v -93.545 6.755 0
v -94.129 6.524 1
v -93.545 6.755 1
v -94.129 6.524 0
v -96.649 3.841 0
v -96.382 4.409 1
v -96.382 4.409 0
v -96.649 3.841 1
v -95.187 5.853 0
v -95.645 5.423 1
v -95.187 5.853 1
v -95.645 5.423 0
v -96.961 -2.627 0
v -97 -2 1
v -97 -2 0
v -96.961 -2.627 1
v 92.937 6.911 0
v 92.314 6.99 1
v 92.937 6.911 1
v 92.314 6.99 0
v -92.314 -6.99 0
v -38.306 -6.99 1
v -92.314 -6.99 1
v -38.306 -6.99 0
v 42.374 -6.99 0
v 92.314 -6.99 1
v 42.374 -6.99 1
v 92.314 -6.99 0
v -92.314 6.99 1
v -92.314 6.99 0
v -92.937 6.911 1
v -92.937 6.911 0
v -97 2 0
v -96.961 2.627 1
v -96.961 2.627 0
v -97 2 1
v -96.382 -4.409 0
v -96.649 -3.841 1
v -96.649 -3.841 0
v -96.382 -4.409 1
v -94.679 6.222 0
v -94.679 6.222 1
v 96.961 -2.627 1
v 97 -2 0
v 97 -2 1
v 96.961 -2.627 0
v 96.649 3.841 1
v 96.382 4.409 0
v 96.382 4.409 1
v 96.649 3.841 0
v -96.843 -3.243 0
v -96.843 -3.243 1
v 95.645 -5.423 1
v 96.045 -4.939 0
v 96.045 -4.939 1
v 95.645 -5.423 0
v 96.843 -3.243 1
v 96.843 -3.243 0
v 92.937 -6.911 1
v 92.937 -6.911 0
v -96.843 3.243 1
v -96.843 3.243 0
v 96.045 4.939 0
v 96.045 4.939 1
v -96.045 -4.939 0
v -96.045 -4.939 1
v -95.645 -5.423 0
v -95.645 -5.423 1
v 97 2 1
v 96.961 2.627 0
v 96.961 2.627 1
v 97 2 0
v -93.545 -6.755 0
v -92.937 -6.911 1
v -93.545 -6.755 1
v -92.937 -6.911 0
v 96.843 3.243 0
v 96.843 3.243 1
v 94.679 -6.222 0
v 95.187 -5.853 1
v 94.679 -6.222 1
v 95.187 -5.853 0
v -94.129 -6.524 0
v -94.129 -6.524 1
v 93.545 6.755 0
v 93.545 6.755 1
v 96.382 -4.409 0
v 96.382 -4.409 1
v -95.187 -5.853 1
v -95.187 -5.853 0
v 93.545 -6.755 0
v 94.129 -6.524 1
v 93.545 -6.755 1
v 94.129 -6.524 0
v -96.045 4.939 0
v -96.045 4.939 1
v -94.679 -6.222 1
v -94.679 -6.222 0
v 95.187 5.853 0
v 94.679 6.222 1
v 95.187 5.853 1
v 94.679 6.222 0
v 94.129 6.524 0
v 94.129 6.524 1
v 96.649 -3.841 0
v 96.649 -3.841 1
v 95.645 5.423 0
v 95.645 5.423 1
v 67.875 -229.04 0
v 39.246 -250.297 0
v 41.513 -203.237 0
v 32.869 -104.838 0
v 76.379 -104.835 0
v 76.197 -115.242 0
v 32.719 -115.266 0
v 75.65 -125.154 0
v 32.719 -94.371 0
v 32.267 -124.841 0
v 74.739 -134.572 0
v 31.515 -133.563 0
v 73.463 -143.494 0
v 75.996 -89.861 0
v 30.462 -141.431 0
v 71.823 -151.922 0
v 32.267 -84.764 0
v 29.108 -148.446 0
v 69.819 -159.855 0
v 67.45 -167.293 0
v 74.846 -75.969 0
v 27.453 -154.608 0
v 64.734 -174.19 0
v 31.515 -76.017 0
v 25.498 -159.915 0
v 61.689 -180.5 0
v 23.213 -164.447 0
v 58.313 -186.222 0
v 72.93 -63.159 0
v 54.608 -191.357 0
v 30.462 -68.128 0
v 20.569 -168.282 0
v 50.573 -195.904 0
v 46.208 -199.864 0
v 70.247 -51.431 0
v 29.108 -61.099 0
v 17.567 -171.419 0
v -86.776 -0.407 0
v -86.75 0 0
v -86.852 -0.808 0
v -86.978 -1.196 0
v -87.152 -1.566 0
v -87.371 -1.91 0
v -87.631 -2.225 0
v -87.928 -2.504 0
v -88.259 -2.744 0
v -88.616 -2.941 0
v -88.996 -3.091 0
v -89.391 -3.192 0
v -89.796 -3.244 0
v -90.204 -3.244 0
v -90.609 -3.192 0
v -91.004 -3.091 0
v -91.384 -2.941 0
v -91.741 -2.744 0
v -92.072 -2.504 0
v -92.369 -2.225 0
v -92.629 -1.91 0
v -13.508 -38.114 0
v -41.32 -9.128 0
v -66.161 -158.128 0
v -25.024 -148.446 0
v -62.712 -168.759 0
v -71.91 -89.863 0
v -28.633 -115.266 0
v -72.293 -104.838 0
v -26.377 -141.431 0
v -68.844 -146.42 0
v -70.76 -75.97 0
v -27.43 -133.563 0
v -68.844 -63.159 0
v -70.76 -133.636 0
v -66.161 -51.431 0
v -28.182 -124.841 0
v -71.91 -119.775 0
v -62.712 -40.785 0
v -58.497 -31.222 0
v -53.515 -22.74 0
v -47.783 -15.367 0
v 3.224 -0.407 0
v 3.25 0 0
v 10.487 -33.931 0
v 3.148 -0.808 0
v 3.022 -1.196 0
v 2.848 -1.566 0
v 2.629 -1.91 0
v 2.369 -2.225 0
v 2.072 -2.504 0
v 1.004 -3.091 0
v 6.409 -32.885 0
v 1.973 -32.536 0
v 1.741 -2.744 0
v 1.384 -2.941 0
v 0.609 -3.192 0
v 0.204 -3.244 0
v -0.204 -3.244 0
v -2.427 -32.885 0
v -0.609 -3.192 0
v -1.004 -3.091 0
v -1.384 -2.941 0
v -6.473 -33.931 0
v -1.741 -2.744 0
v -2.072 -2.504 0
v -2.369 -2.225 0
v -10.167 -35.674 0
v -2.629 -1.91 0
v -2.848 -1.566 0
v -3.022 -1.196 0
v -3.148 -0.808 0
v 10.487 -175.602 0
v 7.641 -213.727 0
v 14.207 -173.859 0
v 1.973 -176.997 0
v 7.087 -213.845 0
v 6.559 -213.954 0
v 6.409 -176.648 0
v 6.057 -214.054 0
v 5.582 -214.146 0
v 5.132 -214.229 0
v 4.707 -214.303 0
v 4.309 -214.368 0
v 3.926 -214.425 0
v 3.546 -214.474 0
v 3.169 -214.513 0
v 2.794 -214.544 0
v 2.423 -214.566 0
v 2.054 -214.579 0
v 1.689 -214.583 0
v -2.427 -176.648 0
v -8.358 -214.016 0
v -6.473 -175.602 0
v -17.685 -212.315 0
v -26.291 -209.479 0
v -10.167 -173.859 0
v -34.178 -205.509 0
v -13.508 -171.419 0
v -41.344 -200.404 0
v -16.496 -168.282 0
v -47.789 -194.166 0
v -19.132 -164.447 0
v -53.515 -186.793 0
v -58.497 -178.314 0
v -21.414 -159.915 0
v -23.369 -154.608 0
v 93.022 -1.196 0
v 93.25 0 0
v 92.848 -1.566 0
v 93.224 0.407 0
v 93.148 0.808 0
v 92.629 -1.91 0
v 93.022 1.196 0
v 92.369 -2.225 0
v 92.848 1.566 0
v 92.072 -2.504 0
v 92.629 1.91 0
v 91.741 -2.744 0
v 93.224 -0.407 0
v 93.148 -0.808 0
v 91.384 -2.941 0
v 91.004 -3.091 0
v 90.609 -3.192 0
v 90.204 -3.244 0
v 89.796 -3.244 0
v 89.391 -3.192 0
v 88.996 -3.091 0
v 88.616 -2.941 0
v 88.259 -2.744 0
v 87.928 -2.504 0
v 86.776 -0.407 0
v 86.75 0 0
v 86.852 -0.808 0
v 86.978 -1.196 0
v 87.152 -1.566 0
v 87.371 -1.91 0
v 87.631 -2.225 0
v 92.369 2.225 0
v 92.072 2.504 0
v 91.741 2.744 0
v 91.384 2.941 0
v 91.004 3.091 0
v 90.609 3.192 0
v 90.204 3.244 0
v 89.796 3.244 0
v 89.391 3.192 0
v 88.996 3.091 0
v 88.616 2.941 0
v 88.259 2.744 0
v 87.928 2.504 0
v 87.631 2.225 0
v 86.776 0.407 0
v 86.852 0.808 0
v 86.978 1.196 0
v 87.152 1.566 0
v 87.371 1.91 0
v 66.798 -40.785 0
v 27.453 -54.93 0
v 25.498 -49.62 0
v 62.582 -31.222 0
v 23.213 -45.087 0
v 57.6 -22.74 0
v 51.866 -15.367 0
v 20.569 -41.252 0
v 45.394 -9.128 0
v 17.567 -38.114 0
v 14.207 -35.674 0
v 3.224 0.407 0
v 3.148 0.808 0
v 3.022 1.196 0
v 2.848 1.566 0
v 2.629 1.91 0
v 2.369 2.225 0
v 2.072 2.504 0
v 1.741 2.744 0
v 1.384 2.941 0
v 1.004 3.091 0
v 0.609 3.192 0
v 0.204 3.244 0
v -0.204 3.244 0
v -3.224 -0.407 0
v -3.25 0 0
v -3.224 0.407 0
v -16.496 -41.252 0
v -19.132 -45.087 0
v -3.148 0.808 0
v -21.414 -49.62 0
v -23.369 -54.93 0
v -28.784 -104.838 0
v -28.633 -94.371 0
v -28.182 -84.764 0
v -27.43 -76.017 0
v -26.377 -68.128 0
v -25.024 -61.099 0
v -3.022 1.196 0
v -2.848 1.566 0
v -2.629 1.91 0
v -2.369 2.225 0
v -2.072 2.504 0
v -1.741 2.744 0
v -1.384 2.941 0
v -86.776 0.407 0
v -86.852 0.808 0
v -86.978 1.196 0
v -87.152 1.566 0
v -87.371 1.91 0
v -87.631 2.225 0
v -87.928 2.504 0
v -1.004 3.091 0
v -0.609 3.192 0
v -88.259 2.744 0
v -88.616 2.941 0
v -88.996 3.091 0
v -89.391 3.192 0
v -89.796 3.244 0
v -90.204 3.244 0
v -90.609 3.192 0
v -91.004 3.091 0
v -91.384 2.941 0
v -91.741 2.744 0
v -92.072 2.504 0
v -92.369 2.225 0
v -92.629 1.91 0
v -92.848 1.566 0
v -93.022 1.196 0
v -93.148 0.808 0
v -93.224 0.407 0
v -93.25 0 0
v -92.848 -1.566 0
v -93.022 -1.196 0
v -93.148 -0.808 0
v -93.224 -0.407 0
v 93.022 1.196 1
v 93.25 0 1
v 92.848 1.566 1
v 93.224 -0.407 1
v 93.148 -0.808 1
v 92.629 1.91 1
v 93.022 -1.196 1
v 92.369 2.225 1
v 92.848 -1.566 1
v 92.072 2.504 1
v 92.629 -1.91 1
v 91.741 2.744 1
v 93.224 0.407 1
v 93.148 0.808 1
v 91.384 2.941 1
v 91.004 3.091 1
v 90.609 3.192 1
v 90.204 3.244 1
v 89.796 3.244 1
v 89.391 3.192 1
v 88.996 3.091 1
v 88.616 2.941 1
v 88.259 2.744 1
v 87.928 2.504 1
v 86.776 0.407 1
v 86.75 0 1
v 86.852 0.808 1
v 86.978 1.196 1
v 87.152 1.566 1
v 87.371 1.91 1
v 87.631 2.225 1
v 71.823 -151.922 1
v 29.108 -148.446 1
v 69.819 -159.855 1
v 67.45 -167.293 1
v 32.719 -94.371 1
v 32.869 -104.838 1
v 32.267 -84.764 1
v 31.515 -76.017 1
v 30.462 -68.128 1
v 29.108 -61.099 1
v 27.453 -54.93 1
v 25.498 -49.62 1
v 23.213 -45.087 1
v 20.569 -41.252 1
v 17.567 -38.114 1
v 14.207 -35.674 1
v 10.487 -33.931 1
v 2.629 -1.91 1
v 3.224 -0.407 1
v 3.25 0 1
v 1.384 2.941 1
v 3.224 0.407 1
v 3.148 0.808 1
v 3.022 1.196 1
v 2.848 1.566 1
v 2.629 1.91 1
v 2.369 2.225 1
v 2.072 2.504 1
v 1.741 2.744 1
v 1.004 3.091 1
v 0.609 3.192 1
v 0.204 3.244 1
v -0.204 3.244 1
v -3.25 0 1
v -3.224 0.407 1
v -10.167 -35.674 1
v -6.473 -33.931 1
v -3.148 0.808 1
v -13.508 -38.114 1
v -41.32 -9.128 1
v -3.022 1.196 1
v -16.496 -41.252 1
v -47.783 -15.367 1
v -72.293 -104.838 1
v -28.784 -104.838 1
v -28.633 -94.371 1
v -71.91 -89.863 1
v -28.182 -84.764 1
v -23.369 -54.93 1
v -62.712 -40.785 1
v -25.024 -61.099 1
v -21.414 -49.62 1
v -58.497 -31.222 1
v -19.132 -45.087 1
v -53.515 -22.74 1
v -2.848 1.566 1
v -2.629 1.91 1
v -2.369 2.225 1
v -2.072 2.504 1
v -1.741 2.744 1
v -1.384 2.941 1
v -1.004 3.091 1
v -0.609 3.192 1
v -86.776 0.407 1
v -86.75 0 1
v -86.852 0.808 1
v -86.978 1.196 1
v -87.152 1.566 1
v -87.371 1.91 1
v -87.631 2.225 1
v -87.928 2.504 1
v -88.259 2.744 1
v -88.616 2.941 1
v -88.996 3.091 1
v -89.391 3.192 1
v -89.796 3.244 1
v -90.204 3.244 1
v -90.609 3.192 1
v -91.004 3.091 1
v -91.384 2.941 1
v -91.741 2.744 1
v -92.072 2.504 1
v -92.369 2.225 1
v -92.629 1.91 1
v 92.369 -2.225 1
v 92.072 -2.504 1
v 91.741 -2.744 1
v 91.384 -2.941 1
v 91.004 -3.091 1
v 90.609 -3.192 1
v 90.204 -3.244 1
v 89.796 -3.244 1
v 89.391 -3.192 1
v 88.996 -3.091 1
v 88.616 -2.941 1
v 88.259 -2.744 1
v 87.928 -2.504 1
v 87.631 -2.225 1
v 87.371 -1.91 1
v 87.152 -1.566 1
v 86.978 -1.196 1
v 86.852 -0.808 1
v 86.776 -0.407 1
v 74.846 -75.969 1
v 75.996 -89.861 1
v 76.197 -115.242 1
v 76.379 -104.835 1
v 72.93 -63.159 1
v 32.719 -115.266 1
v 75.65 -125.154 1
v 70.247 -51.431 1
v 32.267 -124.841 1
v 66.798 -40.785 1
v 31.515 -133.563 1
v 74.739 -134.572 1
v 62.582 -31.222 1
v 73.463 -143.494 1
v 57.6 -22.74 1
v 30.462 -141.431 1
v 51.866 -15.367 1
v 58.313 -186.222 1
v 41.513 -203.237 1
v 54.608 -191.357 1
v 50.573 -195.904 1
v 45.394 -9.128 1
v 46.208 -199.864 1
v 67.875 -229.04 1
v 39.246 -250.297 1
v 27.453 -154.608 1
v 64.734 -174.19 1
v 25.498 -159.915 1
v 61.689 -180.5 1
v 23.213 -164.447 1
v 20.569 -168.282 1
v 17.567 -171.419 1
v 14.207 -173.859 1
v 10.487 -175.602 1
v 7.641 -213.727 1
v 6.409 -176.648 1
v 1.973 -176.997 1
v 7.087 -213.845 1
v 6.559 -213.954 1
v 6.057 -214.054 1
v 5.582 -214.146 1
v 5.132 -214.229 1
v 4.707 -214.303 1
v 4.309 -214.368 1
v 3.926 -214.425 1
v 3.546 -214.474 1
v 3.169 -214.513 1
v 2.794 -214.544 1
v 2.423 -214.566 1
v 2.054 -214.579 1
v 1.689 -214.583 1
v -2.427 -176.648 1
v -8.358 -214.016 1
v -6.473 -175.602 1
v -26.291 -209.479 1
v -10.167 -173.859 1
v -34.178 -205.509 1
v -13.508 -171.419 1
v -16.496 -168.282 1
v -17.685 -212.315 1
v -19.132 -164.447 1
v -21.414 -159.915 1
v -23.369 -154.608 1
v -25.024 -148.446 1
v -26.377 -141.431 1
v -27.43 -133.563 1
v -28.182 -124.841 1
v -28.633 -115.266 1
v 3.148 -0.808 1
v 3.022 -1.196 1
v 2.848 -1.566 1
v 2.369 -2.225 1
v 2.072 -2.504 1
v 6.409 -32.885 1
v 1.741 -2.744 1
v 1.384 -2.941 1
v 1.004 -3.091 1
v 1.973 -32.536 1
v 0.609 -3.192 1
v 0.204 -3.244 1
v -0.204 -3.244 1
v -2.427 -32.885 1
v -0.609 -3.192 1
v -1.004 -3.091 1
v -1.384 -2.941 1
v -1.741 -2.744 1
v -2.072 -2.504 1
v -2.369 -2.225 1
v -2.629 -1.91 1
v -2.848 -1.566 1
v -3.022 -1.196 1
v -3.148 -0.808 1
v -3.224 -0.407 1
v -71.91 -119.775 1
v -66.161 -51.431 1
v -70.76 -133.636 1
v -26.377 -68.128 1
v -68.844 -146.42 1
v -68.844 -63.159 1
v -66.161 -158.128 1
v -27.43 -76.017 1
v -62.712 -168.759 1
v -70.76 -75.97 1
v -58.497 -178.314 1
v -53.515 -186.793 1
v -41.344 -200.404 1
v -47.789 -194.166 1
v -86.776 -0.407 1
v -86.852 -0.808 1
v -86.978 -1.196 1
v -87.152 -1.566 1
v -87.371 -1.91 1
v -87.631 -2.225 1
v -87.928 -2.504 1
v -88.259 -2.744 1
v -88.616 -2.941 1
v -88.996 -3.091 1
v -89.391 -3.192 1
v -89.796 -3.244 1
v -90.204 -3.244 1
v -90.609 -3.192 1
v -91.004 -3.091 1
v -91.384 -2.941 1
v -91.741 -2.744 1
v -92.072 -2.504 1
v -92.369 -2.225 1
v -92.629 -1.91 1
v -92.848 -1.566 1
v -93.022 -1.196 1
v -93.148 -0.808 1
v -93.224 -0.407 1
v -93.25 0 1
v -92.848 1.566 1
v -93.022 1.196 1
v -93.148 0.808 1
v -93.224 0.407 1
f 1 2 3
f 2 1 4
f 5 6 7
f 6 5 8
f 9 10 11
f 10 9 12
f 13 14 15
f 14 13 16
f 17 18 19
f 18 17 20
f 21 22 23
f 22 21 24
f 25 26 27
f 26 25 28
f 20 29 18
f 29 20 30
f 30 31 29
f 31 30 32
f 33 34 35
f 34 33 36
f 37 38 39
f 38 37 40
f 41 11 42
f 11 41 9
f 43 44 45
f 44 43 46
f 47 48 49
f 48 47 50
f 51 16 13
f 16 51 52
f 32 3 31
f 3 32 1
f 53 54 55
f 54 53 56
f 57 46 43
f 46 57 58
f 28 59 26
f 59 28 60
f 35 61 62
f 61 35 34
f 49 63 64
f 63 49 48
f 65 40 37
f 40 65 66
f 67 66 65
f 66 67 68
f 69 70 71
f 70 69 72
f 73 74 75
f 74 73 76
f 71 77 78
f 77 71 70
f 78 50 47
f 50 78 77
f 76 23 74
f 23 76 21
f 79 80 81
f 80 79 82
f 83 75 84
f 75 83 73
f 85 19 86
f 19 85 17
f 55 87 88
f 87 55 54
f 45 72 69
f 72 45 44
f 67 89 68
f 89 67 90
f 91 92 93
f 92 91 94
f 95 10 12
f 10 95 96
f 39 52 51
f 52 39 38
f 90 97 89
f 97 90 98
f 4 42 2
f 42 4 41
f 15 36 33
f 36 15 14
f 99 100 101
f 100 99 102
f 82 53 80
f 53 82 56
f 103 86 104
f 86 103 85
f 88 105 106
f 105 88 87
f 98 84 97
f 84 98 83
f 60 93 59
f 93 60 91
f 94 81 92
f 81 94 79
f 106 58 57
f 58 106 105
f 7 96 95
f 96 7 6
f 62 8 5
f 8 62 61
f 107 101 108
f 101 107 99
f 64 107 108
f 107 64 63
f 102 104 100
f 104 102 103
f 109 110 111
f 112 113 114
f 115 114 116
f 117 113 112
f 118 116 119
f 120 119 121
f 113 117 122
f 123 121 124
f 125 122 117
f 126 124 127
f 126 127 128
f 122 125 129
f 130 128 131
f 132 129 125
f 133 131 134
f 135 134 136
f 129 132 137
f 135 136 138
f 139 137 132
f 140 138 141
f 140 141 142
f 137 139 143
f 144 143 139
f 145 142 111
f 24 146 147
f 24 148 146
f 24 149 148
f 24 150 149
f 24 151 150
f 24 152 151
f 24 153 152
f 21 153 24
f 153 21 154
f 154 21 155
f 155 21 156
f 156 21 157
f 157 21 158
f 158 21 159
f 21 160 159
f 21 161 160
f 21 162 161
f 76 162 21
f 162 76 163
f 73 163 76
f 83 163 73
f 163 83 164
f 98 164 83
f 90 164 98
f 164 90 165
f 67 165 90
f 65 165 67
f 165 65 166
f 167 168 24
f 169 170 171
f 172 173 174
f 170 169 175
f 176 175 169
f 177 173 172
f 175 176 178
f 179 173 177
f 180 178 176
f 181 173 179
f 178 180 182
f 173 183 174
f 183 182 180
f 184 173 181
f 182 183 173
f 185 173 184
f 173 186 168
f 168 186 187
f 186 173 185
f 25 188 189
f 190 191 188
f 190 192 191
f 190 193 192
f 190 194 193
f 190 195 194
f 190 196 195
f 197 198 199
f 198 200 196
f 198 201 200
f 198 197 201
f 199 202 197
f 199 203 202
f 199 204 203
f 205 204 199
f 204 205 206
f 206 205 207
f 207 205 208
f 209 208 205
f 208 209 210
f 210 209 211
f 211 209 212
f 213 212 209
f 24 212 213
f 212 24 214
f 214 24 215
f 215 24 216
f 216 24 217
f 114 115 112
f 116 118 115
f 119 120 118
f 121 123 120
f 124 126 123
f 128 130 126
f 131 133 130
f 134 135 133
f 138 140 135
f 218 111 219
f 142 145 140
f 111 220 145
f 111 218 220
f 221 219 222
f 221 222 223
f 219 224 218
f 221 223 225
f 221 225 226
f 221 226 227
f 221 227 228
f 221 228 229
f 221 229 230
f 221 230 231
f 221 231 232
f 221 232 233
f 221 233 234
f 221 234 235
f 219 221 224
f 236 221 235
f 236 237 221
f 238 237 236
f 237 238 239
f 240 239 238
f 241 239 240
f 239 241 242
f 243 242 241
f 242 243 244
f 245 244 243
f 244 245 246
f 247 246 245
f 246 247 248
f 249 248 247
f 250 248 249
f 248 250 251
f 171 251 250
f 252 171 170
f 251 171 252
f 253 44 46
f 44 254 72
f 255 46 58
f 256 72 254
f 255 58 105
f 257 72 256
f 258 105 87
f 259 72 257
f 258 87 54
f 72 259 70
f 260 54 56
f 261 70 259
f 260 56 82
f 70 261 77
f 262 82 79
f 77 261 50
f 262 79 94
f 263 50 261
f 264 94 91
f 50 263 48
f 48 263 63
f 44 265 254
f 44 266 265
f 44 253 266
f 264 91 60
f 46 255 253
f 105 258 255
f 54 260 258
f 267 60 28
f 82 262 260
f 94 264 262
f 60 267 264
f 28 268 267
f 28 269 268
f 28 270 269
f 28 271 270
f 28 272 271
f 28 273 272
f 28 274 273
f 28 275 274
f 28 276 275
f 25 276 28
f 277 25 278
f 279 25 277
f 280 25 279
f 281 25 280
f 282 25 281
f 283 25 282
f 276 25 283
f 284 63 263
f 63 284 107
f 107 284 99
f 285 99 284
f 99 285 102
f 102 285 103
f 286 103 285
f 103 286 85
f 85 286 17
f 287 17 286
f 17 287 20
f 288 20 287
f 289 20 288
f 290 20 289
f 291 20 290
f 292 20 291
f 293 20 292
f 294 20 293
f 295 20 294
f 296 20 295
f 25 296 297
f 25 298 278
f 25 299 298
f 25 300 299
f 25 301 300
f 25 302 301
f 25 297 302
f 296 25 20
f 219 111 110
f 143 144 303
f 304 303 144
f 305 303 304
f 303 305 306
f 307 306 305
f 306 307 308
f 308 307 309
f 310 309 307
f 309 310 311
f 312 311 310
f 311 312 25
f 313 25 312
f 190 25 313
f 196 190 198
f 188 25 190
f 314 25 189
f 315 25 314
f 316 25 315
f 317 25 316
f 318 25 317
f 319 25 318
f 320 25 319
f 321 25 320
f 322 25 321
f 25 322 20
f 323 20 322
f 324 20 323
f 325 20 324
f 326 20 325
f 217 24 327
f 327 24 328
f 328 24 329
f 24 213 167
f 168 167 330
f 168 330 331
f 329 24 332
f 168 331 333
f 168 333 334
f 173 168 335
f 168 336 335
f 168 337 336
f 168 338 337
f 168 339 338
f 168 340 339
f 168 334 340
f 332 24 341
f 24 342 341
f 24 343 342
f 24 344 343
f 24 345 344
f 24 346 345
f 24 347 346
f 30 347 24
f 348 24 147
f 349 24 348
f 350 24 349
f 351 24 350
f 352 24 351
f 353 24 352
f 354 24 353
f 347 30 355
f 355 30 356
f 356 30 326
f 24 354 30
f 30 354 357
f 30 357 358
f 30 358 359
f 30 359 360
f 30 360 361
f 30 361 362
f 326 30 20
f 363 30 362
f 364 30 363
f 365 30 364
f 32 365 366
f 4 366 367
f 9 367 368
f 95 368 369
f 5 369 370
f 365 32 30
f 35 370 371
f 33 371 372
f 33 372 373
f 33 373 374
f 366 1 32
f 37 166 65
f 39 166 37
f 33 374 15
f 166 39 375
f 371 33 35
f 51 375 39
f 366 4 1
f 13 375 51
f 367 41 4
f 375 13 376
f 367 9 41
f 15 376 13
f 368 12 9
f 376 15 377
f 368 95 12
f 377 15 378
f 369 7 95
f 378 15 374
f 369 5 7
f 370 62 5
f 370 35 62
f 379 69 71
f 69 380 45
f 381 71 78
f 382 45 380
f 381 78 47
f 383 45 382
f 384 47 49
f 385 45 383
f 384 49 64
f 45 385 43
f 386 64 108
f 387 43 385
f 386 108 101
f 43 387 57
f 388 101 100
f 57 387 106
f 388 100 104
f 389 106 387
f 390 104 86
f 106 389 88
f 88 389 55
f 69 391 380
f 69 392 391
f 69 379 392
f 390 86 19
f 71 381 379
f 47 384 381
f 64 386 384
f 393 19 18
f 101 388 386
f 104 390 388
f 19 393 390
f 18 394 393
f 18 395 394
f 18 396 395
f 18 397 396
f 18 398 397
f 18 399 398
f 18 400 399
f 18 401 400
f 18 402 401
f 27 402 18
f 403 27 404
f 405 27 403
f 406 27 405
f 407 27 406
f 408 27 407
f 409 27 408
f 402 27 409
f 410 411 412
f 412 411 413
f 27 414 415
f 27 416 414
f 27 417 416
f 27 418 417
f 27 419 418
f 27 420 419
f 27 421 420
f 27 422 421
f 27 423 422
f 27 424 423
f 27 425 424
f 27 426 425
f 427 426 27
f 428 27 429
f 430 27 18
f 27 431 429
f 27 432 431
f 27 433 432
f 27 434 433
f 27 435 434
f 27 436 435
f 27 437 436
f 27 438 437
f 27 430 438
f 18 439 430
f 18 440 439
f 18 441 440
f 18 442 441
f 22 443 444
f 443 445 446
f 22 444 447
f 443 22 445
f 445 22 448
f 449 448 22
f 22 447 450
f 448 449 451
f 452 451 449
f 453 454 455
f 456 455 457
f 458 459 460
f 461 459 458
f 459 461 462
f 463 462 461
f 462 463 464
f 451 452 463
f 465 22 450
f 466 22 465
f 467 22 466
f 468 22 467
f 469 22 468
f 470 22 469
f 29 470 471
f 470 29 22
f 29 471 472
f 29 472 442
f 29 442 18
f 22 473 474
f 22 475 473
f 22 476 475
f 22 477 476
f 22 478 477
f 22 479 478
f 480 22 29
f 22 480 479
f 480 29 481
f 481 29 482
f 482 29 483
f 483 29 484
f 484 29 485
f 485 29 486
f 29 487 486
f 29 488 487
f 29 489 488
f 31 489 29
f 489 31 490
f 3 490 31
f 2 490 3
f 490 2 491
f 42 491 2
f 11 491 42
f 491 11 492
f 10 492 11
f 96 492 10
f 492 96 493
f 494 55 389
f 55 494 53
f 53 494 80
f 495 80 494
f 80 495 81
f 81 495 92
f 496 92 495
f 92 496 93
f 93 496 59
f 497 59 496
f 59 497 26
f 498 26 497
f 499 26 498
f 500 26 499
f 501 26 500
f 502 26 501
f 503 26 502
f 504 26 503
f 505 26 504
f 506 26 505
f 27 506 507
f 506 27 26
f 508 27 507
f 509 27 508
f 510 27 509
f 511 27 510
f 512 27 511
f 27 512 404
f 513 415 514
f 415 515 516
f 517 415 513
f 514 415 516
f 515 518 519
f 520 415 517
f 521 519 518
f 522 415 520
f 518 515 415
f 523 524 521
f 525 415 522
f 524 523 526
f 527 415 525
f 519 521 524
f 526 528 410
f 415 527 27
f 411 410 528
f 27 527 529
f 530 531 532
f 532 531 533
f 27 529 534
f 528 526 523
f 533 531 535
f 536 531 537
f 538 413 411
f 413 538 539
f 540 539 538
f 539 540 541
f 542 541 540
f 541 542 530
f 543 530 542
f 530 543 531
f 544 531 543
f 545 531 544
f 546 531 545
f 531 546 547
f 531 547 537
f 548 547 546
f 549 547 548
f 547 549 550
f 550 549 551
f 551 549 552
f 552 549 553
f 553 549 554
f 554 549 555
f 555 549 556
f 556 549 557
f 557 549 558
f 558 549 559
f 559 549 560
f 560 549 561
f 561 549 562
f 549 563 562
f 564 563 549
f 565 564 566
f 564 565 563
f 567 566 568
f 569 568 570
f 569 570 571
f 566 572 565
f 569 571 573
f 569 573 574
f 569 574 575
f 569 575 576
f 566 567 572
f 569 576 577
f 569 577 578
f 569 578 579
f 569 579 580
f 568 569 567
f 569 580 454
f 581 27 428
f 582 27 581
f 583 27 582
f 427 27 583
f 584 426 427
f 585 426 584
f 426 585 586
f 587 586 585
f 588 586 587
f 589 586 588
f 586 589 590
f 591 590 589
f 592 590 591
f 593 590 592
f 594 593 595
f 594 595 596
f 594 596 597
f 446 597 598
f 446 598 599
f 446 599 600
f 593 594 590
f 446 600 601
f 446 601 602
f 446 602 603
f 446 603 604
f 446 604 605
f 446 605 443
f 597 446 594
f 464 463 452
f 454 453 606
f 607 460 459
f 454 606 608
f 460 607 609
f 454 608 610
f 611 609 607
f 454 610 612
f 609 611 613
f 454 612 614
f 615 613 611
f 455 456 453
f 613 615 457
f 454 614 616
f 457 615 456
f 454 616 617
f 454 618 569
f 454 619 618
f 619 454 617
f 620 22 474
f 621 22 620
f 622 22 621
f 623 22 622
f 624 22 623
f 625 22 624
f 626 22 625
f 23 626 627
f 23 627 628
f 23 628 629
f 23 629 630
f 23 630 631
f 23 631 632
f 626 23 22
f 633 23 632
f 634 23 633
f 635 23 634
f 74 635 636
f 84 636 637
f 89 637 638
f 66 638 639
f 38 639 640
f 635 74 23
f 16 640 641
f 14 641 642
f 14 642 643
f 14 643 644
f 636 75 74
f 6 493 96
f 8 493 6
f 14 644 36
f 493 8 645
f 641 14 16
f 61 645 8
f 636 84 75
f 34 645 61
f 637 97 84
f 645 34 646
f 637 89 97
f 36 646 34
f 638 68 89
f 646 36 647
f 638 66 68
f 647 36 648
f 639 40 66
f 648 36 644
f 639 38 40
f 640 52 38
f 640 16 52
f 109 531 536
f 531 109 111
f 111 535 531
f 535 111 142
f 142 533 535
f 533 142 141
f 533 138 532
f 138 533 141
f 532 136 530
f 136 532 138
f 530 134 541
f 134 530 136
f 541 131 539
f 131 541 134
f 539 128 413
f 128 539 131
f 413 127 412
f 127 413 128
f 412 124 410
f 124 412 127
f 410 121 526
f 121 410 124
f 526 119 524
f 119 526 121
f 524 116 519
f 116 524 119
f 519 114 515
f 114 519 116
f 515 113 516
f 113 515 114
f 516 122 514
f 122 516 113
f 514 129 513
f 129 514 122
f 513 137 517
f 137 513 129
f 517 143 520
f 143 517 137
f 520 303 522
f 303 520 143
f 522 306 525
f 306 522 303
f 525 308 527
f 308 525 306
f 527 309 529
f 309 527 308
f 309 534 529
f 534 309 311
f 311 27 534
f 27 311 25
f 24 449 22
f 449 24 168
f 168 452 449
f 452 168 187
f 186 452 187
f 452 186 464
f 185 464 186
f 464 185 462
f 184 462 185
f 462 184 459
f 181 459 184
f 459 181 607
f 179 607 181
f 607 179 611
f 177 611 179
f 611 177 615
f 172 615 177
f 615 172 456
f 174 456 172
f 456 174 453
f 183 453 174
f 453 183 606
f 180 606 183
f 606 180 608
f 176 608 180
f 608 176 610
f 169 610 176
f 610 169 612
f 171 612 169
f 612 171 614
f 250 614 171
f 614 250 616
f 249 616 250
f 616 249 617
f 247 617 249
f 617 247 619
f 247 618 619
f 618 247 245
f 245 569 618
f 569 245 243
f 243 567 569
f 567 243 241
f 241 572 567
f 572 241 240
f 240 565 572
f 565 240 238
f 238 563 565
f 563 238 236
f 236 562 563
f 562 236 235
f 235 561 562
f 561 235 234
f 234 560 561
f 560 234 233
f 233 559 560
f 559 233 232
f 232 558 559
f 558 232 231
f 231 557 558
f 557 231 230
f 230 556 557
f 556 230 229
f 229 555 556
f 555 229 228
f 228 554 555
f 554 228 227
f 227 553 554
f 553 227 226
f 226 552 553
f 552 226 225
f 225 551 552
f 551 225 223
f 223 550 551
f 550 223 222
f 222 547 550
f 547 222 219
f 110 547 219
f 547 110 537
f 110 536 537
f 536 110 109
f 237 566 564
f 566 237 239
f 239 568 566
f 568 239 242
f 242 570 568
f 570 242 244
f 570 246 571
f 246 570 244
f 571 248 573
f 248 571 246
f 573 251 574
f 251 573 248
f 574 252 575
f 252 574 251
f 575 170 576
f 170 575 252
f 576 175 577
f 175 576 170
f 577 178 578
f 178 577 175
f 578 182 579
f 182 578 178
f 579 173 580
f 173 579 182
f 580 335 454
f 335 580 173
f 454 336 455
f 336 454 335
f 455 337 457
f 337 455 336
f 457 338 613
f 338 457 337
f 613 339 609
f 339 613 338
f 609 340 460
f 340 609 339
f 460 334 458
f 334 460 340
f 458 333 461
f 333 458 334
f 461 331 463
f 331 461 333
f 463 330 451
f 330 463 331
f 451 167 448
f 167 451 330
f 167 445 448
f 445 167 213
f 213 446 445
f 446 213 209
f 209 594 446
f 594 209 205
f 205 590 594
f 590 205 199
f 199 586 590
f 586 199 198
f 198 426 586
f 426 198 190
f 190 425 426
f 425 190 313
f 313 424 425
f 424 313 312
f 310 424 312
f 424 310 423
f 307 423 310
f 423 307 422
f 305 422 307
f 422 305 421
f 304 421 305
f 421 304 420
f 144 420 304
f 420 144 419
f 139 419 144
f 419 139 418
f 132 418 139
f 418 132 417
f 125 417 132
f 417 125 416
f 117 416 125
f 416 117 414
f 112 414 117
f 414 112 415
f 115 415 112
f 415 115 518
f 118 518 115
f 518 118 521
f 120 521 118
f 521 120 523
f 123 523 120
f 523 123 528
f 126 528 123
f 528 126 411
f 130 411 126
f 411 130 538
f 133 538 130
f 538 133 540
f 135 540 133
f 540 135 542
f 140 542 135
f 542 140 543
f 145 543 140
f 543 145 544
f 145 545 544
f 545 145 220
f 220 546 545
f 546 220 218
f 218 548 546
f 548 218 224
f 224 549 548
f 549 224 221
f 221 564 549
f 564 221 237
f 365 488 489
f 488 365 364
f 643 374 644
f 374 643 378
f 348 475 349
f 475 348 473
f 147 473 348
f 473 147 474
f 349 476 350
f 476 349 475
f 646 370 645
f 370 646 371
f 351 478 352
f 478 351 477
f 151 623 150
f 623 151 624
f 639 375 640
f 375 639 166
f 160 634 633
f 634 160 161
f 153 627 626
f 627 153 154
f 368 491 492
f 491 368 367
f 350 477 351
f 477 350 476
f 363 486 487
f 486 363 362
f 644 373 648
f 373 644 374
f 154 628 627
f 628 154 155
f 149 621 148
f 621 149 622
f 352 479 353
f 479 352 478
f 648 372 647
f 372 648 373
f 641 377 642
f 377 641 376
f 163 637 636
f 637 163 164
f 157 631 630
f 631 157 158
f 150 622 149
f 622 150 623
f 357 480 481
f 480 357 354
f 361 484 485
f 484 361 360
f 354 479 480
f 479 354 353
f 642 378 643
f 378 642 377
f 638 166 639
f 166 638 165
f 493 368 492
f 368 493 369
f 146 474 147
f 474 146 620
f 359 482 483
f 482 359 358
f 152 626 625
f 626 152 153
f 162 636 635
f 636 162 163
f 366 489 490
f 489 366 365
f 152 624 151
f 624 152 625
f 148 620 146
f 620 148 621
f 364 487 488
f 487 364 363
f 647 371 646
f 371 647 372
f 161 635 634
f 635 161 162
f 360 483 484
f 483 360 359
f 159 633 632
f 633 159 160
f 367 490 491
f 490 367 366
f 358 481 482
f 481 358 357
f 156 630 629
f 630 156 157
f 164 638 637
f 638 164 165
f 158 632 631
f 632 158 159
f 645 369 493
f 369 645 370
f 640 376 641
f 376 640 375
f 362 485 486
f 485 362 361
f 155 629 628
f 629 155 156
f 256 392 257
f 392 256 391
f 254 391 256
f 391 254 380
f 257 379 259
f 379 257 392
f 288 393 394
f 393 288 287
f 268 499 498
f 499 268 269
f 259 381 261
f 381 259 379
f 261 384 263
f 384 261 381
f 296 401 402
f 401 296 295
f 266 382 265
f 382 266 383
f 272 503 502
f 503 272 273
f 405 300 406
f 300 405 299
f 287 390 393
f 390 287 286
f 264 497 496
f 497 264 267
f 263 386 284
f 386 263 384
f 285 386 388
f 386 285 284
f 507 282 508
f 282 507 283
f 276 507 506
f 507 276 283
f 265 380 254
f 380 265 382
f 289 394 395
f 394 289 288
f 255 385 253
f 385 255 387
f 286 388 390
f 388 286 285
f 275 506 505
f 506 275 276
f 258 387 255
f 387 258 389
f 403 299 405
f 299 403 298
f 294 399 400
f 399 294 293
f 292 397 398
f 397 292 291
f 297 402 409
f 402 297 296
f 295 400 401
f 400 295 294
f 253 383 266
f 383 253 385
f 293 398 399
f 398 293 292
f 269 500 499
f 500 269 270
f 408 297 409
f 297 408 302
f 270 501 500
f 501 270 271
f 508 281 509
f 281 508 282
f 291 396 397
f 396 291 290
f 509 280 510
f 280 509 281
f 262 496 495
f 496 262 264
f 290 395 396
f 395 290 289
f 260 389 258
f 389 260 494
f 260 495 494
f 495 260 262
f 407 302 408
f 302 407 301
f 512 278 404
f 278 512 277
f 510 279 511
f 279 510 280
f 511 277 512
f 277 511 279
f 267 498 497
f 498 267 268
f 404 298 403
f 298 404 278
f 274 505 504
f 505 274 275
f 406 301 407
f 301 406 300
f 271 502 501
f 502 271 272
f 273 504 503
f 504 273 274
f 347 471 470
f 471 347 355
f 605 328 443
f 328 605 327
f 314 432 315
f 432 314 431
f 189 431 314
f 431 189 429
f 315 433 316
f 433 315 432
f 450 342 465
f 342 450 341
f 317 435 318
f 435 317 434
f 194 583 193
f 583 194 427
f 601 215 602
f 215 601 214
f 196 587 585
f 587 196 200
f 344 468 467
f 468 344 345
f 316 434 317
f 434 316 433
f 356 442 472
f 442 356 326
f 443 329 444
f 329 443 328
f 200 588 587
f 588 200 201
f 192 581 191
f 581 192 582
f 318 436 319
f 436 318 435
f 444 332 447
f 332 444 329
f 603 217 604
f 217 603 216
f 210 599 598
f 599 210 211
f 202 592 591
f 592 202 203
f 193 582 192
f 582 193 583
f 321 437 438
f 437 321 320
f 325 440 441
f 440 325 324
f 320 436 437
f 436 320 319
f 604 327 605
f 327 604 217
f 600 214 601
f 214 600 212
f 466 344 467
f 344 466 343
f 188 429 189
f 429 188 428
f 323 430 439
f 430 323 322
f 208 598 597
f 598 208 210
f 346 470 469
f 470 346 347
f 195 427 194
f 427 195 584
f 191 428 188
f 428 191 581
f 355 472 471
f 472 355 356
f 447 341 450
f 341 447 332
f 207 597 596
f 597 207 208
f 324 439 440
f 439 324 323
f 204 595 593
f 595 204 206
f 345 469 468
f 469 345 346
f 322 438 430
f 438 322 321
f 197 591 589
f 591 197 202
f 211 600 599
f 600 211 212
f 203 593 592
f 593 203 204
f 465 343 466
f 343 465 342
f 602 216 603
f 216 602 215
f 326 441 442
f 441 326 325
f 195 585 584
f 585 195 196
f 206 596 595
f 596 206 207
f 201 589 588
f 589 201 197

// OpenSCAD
$fn = 50;


difference() {
	union() {
		translate(v = [0, 0, 0]) {
			rotate(a = [0, 0, 0]) {
				hull() {
					translate(v = [-92.0000000000, 2.0000000000, 0]) {
						rotate(a = [0, 0, 0]) {
							translate(v = [0, 0, 0]) {
								rotate(a = [0, 0, 0]) {
									cylinder(h = 1, r = 5);
								}
							}
						}
					}
					translate(v = [92.0000000000, 2.0000000000, 0]) {
						rotate(a = [0, 0, 0]) {
							translate(v = [0, 0, 0]) {
								rotate(a = [0, 0, 0]) {
									cylinder(h = 1, r = 5);
								}
							}
						}
					}
					translate(v = [-92.0000000000, -2.0000000000, 0]) {
						rotate(a = [0, 0, 0]) {
							translate(v = [0, 0, 0]) {
								rotate(a = [0, 0, 0]) {
									cylinder(h = 1, r = 5);
								}
							}
						}
					}
					translate(v = [92.0000000000, -2.0000000000, 0]) {
						rotate(a = [0, 0, 0]) {
							translate(v = [0, 0, 0]) {
								rotate(a = [0, 0, 0]) {
									cylinder(h = 1, r = 5);
								}
							}
						}
					}
				}
			}
		}
		translate(v = [0, 0, 0]) {
			rotate(a = [0, 0, 0]) {
				linear_extrude(height = 1) {
					text(font = "DejaVu Sans Mono:style=Bold", halign = "center", size = 209.0000000000, text = "Q", valign = "top");
				}
			}
		}
	}
	union() {
		translate(v = [-90.0000000000, 0.0000000000, -125.0000000000]) {
			rotate(a = [0, 0, 0]) {
				cylinder(h = 250, r = 3.2500000000);
			}
		}
		translate(v = [90.0000000000, 0.0000000000, -125.0000000000]) {
			rotate(a = [0, 0, 0]) {
				cylinder(h = 250, r = 3.2500000000);
			}
		}
		translate(v = [90.0000000000, 0.0000000000, -125.0000000000]) {
			rotate(a = [0, 0, 0]) {
				cylinder(h = 250, r = 3.2500000000);
			}
		}
		translate(v = [0, 0, -125.0000000000]) {
			rotate(a = [0, 0, 0]) {
				cylinder(h = 250, r = 3.2500000000);
			}
		}
	}
}
